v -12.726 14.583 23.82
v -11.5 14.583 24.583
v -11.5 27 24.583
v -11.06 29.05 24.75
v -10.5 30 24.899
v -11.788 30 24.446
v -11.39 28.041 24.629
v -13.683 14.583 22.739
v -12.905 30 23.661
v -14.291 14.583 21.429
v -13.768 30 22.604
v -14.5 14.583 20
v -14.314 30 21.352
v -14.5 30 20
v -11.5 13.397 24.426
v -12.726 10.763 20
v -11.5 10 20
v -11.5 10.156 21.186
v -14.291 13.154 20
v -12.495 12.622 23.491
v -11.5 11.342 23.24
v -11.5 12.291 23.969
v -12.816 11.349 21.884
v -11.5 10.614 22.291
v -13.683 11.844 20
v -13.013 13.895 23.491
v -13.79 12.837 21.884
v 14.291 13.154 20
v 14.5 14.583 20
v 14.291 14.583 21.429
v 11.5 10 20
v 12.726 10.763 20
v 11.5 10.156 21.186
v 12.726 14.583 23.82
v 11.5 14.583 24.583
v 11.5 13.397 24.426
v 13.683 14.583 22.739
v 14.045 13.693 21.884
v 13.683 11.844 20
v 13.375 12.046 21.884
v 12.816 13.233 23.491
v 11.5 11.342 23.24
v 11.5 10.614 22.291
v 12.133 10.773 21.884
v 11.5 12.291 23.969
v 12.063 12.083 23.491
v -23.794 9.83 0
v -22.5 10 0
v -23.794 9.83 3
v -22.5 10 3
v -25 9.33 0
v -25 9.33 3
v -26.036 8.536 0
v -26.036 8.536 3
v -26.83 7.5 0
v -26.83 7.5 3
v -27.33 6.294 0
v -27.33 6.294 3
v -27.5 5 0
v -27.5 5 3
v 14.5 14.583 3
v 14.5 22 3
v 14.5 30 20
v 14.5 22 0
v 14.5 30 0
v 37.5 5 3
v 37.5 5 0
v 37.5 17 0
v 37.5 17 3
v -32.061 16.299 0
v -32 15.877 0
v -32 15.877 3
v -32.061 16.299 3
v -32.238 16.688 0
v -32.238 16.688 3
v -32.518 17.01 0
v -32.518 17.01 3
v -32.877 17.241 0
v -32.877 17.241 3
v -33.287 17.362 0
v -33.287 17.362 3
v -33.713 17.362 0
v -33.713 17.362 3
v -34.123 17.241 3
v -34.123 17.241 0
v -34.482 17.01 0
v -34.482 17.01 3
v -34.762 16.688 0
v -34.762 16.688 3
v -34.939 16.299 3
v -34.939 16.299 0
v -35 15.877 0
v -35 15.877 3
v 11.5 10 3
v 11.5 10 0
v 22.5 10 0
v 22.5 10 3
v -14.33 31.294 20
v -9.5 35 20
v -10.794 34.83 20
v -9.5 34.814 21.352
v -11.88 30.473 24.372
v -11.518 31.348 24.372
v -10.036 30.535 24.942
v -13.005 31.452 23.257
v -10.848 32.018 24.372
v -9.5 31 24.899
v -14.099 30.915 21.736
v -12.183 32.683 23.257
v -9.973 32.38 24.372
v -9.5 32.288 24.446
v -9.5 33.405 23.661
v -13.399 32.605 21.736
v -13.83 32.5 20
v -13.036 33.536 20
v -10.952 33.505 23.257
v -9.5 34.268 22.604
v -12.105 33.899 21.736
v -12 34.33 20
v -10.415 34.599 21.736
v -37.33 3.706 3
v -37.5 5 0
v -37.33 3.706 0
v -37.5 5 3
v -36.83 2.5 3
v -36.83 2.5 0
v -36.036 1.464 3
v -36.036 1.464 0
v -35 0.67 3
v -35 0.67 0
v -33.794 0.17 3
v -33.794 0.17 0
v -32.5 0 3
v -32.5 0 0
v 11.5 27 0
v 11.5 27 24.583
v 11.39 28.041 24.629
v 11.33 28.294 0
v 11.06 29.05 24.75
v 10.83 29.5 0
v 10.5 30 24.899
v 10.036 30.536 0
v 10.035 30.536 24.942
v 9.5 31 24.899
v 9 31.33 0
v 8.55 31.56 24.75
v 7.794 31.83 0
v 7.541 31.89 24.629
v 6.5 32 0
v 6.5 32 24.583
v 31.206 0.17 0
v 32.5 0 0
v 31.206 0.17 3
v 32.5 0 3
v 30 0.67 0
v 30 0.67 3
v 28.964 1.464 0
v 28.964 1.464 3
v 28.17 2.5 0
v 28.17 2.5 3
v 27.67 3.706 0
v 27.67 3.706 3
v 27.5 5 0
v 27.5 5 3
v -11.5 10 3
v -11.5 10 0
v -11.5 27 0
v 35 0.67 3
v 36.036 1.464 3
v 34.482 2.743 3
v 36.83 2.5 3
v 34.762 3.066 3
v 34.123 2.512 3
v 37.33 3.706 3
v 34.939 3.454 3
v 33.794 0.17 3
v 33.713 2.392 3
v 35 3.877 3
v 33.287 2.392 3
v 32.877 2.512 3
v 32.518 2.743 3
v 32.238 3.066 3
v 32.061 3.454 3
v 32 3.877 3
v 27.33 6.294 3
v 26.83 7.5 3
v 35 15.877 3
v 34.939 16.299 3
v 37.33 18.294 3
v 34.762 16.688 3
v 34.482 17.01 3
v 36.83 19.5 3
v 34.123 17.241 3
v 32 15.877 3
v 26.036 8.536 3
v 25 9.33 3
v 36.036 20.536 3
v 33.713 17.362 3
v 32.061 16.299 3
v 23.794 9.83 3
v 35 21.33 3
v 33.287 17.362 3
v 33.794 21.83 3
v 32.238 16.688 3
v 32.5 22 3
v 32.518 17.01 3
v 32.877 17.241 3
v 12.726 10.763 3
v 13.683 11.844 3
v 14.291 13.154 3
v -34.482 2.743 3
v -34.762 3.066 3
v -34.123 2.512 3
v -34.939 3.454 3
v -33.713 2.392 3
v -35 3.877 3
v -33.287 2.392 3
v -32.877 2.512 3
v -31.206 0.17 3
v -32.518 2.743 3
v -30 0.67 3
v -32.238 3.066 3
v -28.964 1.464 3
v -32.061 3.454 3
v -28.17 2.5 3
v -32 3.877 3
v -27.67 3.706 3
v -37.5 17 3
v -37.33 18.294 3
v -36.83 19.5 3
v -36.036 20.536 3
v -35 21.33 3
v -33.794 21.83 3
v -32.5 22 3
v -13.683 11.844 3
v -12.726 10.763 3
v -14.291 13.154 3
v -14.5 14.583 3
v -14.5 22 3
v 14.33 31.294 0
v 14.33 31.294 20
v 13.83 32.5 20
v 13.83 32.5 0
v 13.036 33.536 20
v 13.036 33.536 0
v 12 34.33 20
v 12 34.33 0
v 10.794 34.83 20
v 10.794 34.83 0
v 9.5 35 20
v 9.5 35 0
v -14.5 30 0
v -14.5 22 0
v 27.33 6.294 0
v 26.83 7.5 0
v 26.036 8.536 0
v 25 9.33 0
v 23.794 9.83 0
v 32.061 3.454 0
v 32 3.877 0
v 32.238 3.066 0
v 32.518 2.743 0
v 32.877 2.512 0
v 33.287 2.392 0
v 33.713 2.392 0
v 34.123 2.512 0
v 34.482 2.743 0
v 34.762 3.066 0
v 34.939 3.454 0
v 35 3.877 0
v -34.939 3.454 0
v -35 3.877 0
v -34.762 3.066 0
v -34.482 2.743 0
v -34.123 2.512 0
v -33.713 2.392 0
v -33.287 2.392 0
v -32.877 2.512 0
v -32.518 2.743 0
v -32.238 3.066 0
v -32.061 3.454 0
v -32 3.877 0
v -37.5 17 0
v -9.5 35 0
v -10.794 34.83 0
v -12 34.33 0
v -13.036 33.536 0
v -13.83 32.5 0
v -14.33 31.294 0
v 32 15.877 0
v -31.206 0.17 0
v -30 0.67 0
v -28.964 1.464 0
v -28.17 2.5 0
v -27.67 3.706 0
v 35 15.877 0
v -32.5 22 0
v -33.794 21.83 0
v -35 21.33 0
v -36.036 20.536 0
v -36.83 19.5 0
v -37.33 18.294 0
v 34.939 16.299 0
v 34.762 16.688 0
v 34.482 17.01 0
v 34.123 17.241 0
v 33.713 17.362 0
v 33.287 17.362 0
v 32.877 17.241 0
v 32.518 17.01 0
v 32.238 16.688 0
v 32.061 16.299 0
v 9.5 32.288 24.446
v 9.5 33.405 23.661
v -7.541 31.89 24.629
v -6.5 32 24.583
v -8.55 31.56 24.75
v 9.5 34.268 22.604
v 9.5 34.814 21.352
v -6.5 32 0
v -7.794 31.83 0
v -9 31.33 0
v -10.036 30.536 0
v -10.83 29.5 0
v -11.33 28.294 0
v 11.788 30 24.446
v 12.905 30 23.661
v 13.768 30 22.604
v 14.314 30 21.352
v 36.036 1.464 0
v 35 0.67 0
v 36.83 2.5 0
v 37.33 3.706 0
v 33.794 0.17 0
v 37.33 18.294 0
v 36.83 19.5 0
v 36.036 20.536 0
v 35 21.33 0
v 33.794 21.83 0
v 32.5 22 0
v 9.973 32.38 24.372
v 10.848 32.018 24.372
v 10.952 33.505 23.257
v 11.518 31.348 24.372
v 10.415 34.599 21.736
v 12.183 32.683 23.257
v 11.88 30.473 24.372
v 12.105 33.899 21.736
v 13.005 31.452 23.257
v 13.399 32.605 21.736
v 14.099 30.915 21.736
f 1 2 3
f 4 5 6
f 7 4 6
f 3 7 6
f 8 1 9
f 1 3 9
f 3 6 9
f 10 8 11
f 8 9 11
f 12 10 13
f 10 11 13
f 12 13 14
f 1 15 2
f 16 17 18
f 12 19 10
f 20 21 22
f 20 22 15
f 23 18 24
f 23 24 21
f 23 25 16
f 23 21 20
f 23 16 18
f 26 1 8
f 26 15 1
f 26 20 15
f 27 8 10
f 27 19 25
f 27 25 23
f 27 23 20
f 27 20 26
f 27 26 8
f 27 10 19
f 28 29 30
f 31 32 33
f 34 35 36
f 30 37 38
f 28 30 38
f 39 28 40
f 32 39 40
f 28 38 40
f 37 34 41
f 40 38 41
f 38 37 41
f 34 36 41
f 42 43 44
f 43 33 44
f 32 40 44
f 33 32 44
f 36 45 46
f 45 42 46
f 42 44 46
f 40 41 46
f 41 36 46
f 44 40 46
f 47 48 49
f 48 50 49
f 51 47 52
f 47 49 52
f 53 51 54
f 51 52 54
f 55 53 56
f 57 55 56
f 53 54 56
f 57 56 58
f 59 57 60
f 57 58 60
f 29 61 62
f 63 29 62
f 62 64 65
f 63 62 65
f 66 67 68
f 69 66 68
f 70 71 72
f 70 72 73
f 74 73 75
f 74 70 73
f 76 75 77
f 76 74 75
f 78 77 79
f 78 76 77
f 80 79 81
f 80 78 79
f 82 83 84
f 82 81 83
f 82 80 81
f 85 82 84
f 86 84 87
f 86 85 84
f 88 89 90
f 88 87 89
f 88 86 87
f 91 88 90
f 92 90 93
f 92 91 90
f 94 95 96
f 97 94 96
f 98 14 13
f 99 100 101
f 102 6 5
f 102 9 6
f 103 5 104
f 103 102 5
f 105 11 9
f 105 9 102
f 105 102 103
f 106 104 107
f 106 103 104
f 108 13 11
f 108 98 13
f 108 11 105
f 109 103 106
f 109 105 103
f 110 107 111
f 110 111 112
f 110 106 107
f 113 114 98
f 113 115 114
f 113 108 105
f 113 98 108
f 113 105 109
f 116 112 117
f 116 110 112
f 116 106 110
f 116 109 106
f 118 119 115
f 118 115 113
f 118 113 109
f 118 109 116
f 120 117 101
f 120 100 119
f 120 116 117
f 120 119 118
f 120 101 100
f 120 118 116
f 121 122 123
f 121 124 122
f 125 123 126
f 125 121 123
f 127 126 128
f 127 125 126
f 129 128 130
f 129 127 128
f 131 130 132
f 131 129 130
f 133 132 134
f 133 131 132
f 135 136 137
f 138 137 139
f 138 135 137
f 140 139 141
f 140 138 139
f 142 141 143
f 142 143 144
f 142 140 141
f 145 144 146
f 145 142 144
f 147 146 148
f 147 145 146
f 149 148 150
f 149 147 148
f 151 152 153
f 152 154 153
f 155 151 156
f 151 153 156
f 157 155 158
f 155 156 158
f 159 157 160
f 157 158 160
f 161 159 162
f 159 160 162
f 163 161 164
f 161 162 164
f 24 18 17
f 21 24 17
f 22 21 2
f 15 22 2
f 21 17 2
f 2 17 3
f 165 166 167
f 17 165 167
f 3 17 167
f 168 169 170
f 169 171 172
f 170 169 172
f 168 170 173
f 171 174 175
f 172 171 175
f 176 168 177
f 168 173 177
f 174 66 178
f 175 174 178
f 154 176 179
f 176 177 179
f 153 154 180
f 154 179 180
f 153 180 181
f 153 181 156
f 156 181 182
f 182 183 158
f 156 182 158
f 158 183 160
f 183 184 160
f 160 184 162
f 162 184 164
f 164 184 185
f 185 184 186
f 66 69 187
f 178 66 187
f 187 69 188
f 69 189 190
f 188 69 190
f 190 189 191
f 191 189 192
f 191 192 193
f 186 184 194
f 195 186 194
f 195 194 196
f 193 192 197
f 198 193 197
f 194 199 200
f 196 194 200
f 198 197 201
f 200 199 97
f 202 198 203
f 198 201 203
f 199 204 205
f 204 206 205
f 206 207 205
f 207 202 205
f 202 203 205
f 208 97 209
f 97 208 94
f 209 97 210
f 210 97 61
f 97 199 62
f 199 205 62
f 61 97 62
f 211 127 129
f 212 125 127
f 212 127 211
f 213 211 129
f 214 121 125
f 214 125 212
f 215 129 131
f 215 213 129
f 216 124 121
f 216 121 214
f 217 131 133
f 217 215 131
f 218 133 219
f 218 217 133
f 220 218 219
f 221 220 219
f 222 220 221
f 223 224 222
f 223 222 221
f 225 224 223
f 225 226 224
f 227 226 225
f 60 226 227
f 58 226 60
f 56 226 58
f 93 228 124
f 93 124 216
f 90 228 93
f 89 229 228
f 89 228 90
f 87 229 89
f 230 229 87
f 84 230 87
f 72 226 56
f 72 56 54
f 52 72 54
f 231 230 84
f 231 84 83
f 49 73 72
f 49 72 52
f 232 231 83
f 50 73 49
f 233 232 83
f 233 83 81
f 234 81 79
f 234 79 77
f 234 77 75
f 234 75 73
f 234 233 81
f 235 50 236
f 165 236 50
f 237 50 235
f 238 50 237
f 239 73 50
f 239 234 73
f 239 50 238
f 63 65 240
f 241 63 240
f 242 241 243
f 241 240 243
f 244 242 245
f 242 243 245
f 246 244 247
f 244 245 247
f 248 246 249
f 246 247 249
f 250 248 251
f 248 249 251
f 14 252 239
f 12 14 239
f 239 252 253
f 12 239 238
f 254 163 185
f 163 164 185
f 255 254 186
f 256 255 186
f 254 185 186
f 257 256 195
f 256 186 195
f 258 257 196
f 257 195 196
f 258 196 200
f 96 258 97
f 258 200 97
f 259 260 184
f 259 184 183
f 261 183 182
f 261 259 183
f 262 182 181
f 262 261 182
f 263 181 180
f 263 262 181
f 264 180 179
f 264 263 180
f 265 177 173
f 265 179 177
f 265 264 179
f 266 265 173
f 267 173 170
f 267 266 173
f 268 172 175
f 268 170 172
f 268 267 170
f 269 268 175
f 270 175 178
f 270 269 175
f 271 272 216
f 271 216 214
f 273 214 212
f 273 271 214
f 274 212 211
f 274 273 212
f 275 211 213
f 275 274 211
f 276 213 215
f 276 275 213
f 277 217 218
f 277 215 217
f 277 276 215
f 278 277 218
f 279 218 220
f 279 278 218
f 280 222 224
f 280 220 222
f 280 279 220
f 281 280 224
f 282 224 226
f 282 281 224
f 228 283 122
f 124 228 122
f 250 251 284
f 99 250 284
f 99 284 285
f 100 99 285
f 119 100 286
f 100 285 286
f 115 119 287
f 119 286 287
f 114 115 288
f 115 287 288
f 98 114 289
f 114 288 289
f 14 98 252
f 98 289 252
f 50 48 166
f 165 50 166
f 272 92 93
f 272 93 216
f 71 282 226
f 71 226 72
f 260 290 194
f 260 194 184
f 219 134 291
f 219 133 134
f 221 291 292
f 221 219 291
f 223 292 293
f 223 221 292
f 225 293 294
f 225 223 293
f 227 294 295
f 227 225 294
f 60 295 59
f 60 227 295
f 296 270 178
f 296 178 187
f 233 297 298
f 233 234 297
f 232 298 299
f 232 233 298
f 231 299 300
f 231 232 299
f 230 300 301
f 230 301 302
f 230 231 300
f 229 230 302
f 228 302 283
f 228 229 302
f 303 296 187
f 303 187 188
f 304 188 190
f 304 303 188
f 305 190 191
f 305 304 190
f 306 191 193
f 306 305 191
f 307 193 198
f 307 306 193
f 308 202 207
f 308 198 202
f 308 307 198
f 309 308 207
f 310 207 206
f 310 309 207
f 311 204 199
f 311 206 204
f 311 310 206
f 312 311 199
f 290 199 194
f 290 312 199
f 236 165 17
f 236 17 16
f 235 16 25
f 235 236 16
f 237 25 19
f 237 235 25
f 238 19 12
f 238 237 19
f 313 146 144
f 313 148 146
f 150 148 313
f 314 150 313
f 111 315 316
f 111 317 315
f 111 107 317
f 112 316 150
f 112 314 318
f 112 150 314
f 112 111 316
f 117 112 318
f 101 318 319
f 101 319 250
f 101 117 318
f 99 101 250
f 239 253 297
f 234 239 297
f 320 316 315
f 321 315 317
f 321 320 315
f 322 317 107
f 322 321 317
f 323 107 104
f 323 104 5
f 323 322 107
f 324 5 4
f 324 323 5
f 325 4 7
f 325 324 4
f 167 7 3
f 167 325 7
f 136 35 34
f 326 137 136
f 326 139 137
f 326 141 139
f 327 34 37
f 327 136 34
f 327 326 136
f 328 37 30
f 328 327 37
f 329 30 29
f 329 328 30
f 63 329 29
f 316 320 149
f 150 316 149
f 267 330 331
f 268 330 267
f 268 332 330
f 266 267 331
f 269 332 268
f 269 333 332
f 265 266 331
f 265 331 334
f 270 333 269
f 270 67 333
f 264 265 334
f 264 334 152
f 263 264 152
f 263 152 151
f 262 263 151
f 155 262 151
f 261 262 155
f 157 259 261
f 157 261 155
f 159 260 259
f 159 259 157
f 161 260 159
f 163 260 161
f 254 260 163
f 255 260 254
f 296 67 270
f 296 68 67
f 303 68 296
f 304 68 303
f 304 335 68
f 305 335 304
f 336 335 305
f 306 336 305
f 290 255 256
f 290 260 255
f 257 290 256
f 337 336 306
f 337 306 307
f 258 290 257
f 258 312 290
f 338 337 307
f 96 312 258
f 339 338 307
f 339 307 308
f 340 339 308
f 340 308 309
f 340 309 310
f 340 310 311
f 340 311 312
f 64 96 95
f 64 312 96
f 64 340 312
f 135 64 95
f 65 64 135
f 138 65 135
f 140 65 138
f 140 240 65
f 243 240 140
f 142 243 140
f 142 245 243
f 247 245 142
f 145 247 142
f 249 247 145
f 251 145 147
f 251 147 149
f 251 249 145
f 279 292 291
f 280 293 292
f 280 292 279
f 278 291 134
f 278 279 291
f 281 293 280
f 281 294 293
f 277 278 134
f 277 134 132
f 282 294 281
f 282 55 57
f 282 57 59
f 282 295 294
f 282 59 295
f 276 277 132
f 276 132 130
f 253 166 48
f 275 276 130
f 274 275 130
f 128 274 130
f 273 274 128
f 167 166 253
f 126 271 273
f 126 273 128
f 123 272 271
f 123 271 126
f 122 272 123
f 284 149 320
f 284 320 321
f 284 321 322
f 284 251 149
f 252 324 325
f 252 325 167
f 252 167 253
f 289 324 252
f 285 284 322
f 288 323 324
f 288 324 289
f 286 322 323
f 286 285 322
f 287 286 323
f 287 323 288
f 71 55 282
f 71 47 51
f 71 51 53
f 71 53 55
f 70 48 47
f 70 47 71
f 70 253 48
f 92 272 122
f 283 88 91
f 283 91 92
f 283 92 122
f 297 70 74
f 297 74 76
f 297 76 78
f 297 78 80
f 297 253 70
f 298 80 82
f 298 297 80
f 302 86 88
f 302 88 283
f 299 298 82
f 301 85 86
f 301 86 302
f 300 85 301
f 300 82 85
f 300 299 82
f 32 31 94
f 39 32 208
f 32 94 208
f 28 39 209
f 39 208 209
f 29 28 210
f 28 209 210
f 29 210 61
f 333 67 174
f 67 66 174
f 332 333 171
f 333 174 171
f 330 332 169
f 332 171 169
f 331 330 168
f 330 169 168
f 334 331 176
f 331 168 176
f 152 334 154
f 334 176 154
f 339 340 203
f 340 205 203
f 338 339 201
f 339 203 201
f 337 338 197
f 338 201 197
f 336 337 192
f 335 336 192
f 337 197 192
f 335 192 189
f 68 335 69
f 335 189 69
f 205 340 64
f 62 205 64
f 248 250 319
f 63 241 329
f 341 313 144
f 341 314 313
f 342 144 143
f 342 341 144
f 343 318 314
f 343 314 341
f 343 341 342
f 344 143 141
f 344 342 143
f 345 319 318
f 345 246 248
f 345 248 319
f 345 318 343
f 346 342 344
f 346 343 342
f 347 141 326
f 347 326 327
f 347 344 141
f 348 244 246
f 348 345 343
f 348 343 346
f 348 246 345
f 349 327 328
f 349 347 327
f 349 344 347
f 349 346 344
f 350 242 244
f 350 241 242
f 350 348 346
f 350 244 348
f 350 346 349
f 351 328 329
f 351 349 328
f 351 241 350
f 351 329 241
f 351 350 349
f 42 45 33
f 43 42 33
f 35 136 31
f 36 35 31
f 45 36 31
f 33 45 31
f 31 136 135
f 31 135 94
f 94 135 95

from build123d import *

# Parameters (mm, degrees)
F2_DEPTH     = 25
F3_DEPTH     = 3
F4_DEPTH     = 25
F5_R         = 4.99999
F6_T1_DEPTH  = 25
F6_T3_DEPTH  = 25
F6_T5_DEPTH  = 50
F6_T7_DEPTH  = 33.4564392374
F6_T9_DEPTH  = 50
F6_T11_DEPTH = 33.4564392374
F7_T1_DEPTH  = 15.417424305
F7_T3_DEPTH  = 19
F7_T6_ANGLE  = 89.9999999974
F7_T8_ANGLE  = 89.9999999974
F7_T10_ANGLE = 209.6926070845
F7_T12_ANGLE = 209.6926070845


# Not quite as in the source:
# - a fillet or chamfer that OpenCascade refuses, or shapes differently, is made with other operations: its cross-section is extruded or revolved along the edge and cut away or added
# - a fillet or chamfer is up to 0.001 mm smaller than in the source, because OpenCascade refuses the exact size


with BuildPart() as f2:
    # F0 (on Top) → F2 (new body)
    with BuildSketch(Plane.XY):
        Polygon((14.5, 35), (0, 35), (-14.5, 35), (-14.5, 22), (-14.5, 10), (-11.5, 10), (-11.5, 32), (0, 32), (11.5, 32), (11.5, 10), (14.5, 10), (14.5, 22), align=None)
    extrude(amount=F2_DEPTH)

    # F0 (on Top) → F3 (join)
    with BuildSketch(Plane.XY):
        Polygon((-14.5, 10), (-14.5, 22), (-37.5, 22), (-37.5, 0), (-27.5, 0), (-27.5, 10), align=None)
        Polygon((37.5, 22), (14.5, 22), (14.5, 10), (27.5, 10), (27.5, 0), (37.5, 0), align=None)
    extrude(amount=F3_DEPTH)

    # F1 (on Top) → F4 (cut)
    with BuildSketch(Plane.XY):
        with BuildLine():
            Line((35, 3.8767794613), (35, 15.8767794613))
            ThreePointArc((35, 15.8767794613), (33.5, 17.3767794613), (32, 15.8767794613))
            Line((32, 15.8767794613), (32, 3.8767794613))
            ThreePointArc((32, 3.8767794613), (33.5, 2.3767794613), (35, 3.8767794613))
        make_face()
        with BuildLine():
            ThreePointArc((-32, 15.8767794613), (-33.5, 17.3767794613), (-35, 15.8767794613))
            Line((-35, 15.8767794613), (-35, 3.8767794613))
            ThreePointArc((-35, 3.8767794613), (-33.5, 2.3767794613), (-32, 3.8767794613))
            Line((-32, 3.8767794613), (-32, 15.8767794613))
        make_face()
    extrude(amount=F4_DEPTH, mode=Mode.SUBTRACT)

    # F5 (radius 5 in the source; OpenCascade refuses exactly that, so slightly less here)
    f5_edges = [f2.edges().sort_by_distance(p)[0] for p in [
        (-37.5, 0, 1.5),
        (-27.5, 0, 1.5),
        (-37.5, 22, 1.5),
        (37.5, 22, 1.5),
        (37.5, 0, 1.5),
        (27.5, 0, 1.5),
        (27.5, 10, 1.5),
        (-27.5, 10, 1.5),
    ]]
    fillet(f5_edges, radius=F5_R)

    # F6: fillet of radius 5 on 6 edges, made by hand

    # F6_s2 → F6_t1 (join)
    with BuildSketch(Plane.XY):
        with BuildLine():
            ThreePointArc((11.5, 27), (10.0355339059, 30.5355339059), (6.5, 32))
            Line((6.5, 32), (11.5, 32))
            Line((11.5, 32), (11.5, 27))
        make_face()
    extrude(amount=F6_T1_DEPTH)

    # F6_s4 → F6_t3 (join)
    with BuildSketch(Plane.XY):
        with BuildLine():
            ThreePointArc((-6.5, 32), (-10.0355339059, 30.5355339059), (-11.5, 27))
            Line((-11.5, 27), (-11.5, 32))
            Line((-11.5, 32), (-6.5, 32))
        make_face()
    extrude(amount=F6_T3_DEPTH)

    # F6_s6 → F6_t5 (cut)
    with BuildSketch(Plane.XY.offset(-12.5)):
        with BuildLine():
            ThreePointArc((14.5, 30), (13.0355339059, 33.5355339059), (9.5, 35))
            Line((9.5, 35), (14.5, 35))
            Line((14.5, 35), (14.5, 30))
        make_face()
    extrude(amount=F6_T5_DEPTH, mode=Mode.SUBTRACT)

    # F6_s8 → F6_t7 (cut)
    with BuildSketch(Plane.XY.offset(3)):
        with BuildLine():
            ThreePointArc((11.5, 10), (13.6833001327, 11.8439629074), (14.5, 14.582575695))
            Line((14.5, 14.582575695), (14.5, 10))
            Line((14.5, 10), (11.5, 10))
        make_face()
    extrude(amount=F6_T7_DEPTH, mode=Mode.SUBTRACT)

    # F6_s10 → F6_t9 (cut)
    with BuildSketch(Plane.XY.offset(-12.5)):
        with BuildLine():
            ThreePointArc((-9.5, 35), (-13.0355339059, 33.5355339059), (-14.5, 30))
            Line((-14.5, 30), (-14.5, 35))
            Line((-14.5, 35), (-9.5, 35))
        make_face()
    extrude(amount=F6_T9_DEPTH, mode=Mode.SUBTRACT)

    # F6_s12 → F6_t11 (cut)
    with BuildSketch(Plane.XY.offset(3)):
        with BuildLine():
            ThreePointArc((-11.5, 10), (-13.6833001327, 11.8439629074), (-14.5, 14.582575695))
            Line((-14.5, 14.582575695), (-14.5, 10))
            Line((-14.5, 10), (-11.5, 10))
        make_face()
    extrude(amount=F6_T11_DEPTH, mode=Mode.SUBTRACT)

    # F7: fillet of radius 5 on 3 edges, made by hand

    # F7_s2 → F7_t1 (cut)
    with BuildSketch(Plane.XZ.offset(-30)):
        with BuildLine():
            ThreePointArc((-9.5, 25), (-13.0355339059, 23.5355339059), (-14.5, 20))
            Line((-14.5, 20), (-14.5, 25))
            Line((-14.5, 25), (-9.5, 25))
        make_face()
        with BuildLine():
            ThreePointArc((9.5, 25), (13.0355339059, 23.5355339059), (14.5, 20))
            Line((14.5, 20), (14.5, 25))
            Line((14.5, 25), (9.5, 25))
        make_face()
    extrude(amount=F7_T1_DEPTH, mode=Mode.SUBTRACT)

    # F7_s4 → F7_t3 (cut)
    with BuildSketch(Plane.YZ.offset(-9.5)):
        with BuildLine():
            ThreePointArc((30, 25), (33.5355339059, 23.5355339059), (35, 20))
            Line((35, 20), (35, 25))
            Line((35, 25), (30, 25))
        make_face()
    extrude(amount=F7_T3_DEPTH, mode=Mode.SUBTRACT)

    # F7_s5 → F7_t6 (revolve, cut)
    with BuildSketch(Plane.YZ.offset(9.4999999999)):
        with BuildLine():
            ThreePointArc((30, 25), (33.5355339059, 23.5355339059), (35, 20))
            Line((35, 20), (35, 25))
            Line((35, 25), (30, 25))
        make_face()
    revolve(axis=Axis((9.4999999999, 29.9999999999, 25), (0, 0, -1)), revolution_arc=F7_T6_ANGLE, mode=Mode.SUBTRACT)

    # F7_s7 → F7_t8 (revolve, cut)
    with BuildSketch(Plane.XZ.offset(-29.9999999999)):
        with BuildLine():
            ThreePointArc((-9.5, 25), (-13.0355339059, 23.5355339059), (-14.5, 20))
            Line((-14.5, 20), (-14.5, 25))
            Line((-14.5, 25), (-9.5, 25))
        make_face()
    revolve(axis=Axis((-9.4999999999, 29.9999999999, 25), (0, 0, -1)), revolution_arc=F7_T8_ANGLE, mode=Mode.SUBTRACT)

    # F7_s9 → F7_t10 (revolve, cut)
    with BuildSketch(Plane.XZ.offset(-14.5825756948)):
        with BuildLine():
            ThreePointArc((14.5, 20), (13.0355339059, 23.5355339059), (9.5, 25))
            Line((9.5, 25), (14.5, 25))
            Line((14.5, 25), (14.5, 20))
        make_face()
    revolve(axis=Axis((9.5000000002, 14.5825756948, 25), (0, 0, -1)), revolution_arc=F7_T10_ANGLE, mode=Mode.SUBTRACT)

    # F7_s11 → F7_t12 (revolve, cut)
    with BuildSketch(Plane(origin=(-8.6059581245, 15.0923752984, 0), x_dir=(0, 0, 1), z_dir=(-0.4953465841, 0.8686954366, 0))):
        with BuildLine():
            ThreePointArc((25, -1.02917759), (23.5355339059, 2.506356316), (20, 3.97082241))
            Line((20, 3.97082241), (25, 3.97082241))
            Line((25, 3.97082241), (25, -1.02917759))
        make_face()
    revolve(axis=Axis((-9.5000000002, 14.5825756948, 25), (0, 0, -1)), revolution_arc=F7_T12_ANGLE, mode=Mode.SUBTRACT)


solid = f2.part
